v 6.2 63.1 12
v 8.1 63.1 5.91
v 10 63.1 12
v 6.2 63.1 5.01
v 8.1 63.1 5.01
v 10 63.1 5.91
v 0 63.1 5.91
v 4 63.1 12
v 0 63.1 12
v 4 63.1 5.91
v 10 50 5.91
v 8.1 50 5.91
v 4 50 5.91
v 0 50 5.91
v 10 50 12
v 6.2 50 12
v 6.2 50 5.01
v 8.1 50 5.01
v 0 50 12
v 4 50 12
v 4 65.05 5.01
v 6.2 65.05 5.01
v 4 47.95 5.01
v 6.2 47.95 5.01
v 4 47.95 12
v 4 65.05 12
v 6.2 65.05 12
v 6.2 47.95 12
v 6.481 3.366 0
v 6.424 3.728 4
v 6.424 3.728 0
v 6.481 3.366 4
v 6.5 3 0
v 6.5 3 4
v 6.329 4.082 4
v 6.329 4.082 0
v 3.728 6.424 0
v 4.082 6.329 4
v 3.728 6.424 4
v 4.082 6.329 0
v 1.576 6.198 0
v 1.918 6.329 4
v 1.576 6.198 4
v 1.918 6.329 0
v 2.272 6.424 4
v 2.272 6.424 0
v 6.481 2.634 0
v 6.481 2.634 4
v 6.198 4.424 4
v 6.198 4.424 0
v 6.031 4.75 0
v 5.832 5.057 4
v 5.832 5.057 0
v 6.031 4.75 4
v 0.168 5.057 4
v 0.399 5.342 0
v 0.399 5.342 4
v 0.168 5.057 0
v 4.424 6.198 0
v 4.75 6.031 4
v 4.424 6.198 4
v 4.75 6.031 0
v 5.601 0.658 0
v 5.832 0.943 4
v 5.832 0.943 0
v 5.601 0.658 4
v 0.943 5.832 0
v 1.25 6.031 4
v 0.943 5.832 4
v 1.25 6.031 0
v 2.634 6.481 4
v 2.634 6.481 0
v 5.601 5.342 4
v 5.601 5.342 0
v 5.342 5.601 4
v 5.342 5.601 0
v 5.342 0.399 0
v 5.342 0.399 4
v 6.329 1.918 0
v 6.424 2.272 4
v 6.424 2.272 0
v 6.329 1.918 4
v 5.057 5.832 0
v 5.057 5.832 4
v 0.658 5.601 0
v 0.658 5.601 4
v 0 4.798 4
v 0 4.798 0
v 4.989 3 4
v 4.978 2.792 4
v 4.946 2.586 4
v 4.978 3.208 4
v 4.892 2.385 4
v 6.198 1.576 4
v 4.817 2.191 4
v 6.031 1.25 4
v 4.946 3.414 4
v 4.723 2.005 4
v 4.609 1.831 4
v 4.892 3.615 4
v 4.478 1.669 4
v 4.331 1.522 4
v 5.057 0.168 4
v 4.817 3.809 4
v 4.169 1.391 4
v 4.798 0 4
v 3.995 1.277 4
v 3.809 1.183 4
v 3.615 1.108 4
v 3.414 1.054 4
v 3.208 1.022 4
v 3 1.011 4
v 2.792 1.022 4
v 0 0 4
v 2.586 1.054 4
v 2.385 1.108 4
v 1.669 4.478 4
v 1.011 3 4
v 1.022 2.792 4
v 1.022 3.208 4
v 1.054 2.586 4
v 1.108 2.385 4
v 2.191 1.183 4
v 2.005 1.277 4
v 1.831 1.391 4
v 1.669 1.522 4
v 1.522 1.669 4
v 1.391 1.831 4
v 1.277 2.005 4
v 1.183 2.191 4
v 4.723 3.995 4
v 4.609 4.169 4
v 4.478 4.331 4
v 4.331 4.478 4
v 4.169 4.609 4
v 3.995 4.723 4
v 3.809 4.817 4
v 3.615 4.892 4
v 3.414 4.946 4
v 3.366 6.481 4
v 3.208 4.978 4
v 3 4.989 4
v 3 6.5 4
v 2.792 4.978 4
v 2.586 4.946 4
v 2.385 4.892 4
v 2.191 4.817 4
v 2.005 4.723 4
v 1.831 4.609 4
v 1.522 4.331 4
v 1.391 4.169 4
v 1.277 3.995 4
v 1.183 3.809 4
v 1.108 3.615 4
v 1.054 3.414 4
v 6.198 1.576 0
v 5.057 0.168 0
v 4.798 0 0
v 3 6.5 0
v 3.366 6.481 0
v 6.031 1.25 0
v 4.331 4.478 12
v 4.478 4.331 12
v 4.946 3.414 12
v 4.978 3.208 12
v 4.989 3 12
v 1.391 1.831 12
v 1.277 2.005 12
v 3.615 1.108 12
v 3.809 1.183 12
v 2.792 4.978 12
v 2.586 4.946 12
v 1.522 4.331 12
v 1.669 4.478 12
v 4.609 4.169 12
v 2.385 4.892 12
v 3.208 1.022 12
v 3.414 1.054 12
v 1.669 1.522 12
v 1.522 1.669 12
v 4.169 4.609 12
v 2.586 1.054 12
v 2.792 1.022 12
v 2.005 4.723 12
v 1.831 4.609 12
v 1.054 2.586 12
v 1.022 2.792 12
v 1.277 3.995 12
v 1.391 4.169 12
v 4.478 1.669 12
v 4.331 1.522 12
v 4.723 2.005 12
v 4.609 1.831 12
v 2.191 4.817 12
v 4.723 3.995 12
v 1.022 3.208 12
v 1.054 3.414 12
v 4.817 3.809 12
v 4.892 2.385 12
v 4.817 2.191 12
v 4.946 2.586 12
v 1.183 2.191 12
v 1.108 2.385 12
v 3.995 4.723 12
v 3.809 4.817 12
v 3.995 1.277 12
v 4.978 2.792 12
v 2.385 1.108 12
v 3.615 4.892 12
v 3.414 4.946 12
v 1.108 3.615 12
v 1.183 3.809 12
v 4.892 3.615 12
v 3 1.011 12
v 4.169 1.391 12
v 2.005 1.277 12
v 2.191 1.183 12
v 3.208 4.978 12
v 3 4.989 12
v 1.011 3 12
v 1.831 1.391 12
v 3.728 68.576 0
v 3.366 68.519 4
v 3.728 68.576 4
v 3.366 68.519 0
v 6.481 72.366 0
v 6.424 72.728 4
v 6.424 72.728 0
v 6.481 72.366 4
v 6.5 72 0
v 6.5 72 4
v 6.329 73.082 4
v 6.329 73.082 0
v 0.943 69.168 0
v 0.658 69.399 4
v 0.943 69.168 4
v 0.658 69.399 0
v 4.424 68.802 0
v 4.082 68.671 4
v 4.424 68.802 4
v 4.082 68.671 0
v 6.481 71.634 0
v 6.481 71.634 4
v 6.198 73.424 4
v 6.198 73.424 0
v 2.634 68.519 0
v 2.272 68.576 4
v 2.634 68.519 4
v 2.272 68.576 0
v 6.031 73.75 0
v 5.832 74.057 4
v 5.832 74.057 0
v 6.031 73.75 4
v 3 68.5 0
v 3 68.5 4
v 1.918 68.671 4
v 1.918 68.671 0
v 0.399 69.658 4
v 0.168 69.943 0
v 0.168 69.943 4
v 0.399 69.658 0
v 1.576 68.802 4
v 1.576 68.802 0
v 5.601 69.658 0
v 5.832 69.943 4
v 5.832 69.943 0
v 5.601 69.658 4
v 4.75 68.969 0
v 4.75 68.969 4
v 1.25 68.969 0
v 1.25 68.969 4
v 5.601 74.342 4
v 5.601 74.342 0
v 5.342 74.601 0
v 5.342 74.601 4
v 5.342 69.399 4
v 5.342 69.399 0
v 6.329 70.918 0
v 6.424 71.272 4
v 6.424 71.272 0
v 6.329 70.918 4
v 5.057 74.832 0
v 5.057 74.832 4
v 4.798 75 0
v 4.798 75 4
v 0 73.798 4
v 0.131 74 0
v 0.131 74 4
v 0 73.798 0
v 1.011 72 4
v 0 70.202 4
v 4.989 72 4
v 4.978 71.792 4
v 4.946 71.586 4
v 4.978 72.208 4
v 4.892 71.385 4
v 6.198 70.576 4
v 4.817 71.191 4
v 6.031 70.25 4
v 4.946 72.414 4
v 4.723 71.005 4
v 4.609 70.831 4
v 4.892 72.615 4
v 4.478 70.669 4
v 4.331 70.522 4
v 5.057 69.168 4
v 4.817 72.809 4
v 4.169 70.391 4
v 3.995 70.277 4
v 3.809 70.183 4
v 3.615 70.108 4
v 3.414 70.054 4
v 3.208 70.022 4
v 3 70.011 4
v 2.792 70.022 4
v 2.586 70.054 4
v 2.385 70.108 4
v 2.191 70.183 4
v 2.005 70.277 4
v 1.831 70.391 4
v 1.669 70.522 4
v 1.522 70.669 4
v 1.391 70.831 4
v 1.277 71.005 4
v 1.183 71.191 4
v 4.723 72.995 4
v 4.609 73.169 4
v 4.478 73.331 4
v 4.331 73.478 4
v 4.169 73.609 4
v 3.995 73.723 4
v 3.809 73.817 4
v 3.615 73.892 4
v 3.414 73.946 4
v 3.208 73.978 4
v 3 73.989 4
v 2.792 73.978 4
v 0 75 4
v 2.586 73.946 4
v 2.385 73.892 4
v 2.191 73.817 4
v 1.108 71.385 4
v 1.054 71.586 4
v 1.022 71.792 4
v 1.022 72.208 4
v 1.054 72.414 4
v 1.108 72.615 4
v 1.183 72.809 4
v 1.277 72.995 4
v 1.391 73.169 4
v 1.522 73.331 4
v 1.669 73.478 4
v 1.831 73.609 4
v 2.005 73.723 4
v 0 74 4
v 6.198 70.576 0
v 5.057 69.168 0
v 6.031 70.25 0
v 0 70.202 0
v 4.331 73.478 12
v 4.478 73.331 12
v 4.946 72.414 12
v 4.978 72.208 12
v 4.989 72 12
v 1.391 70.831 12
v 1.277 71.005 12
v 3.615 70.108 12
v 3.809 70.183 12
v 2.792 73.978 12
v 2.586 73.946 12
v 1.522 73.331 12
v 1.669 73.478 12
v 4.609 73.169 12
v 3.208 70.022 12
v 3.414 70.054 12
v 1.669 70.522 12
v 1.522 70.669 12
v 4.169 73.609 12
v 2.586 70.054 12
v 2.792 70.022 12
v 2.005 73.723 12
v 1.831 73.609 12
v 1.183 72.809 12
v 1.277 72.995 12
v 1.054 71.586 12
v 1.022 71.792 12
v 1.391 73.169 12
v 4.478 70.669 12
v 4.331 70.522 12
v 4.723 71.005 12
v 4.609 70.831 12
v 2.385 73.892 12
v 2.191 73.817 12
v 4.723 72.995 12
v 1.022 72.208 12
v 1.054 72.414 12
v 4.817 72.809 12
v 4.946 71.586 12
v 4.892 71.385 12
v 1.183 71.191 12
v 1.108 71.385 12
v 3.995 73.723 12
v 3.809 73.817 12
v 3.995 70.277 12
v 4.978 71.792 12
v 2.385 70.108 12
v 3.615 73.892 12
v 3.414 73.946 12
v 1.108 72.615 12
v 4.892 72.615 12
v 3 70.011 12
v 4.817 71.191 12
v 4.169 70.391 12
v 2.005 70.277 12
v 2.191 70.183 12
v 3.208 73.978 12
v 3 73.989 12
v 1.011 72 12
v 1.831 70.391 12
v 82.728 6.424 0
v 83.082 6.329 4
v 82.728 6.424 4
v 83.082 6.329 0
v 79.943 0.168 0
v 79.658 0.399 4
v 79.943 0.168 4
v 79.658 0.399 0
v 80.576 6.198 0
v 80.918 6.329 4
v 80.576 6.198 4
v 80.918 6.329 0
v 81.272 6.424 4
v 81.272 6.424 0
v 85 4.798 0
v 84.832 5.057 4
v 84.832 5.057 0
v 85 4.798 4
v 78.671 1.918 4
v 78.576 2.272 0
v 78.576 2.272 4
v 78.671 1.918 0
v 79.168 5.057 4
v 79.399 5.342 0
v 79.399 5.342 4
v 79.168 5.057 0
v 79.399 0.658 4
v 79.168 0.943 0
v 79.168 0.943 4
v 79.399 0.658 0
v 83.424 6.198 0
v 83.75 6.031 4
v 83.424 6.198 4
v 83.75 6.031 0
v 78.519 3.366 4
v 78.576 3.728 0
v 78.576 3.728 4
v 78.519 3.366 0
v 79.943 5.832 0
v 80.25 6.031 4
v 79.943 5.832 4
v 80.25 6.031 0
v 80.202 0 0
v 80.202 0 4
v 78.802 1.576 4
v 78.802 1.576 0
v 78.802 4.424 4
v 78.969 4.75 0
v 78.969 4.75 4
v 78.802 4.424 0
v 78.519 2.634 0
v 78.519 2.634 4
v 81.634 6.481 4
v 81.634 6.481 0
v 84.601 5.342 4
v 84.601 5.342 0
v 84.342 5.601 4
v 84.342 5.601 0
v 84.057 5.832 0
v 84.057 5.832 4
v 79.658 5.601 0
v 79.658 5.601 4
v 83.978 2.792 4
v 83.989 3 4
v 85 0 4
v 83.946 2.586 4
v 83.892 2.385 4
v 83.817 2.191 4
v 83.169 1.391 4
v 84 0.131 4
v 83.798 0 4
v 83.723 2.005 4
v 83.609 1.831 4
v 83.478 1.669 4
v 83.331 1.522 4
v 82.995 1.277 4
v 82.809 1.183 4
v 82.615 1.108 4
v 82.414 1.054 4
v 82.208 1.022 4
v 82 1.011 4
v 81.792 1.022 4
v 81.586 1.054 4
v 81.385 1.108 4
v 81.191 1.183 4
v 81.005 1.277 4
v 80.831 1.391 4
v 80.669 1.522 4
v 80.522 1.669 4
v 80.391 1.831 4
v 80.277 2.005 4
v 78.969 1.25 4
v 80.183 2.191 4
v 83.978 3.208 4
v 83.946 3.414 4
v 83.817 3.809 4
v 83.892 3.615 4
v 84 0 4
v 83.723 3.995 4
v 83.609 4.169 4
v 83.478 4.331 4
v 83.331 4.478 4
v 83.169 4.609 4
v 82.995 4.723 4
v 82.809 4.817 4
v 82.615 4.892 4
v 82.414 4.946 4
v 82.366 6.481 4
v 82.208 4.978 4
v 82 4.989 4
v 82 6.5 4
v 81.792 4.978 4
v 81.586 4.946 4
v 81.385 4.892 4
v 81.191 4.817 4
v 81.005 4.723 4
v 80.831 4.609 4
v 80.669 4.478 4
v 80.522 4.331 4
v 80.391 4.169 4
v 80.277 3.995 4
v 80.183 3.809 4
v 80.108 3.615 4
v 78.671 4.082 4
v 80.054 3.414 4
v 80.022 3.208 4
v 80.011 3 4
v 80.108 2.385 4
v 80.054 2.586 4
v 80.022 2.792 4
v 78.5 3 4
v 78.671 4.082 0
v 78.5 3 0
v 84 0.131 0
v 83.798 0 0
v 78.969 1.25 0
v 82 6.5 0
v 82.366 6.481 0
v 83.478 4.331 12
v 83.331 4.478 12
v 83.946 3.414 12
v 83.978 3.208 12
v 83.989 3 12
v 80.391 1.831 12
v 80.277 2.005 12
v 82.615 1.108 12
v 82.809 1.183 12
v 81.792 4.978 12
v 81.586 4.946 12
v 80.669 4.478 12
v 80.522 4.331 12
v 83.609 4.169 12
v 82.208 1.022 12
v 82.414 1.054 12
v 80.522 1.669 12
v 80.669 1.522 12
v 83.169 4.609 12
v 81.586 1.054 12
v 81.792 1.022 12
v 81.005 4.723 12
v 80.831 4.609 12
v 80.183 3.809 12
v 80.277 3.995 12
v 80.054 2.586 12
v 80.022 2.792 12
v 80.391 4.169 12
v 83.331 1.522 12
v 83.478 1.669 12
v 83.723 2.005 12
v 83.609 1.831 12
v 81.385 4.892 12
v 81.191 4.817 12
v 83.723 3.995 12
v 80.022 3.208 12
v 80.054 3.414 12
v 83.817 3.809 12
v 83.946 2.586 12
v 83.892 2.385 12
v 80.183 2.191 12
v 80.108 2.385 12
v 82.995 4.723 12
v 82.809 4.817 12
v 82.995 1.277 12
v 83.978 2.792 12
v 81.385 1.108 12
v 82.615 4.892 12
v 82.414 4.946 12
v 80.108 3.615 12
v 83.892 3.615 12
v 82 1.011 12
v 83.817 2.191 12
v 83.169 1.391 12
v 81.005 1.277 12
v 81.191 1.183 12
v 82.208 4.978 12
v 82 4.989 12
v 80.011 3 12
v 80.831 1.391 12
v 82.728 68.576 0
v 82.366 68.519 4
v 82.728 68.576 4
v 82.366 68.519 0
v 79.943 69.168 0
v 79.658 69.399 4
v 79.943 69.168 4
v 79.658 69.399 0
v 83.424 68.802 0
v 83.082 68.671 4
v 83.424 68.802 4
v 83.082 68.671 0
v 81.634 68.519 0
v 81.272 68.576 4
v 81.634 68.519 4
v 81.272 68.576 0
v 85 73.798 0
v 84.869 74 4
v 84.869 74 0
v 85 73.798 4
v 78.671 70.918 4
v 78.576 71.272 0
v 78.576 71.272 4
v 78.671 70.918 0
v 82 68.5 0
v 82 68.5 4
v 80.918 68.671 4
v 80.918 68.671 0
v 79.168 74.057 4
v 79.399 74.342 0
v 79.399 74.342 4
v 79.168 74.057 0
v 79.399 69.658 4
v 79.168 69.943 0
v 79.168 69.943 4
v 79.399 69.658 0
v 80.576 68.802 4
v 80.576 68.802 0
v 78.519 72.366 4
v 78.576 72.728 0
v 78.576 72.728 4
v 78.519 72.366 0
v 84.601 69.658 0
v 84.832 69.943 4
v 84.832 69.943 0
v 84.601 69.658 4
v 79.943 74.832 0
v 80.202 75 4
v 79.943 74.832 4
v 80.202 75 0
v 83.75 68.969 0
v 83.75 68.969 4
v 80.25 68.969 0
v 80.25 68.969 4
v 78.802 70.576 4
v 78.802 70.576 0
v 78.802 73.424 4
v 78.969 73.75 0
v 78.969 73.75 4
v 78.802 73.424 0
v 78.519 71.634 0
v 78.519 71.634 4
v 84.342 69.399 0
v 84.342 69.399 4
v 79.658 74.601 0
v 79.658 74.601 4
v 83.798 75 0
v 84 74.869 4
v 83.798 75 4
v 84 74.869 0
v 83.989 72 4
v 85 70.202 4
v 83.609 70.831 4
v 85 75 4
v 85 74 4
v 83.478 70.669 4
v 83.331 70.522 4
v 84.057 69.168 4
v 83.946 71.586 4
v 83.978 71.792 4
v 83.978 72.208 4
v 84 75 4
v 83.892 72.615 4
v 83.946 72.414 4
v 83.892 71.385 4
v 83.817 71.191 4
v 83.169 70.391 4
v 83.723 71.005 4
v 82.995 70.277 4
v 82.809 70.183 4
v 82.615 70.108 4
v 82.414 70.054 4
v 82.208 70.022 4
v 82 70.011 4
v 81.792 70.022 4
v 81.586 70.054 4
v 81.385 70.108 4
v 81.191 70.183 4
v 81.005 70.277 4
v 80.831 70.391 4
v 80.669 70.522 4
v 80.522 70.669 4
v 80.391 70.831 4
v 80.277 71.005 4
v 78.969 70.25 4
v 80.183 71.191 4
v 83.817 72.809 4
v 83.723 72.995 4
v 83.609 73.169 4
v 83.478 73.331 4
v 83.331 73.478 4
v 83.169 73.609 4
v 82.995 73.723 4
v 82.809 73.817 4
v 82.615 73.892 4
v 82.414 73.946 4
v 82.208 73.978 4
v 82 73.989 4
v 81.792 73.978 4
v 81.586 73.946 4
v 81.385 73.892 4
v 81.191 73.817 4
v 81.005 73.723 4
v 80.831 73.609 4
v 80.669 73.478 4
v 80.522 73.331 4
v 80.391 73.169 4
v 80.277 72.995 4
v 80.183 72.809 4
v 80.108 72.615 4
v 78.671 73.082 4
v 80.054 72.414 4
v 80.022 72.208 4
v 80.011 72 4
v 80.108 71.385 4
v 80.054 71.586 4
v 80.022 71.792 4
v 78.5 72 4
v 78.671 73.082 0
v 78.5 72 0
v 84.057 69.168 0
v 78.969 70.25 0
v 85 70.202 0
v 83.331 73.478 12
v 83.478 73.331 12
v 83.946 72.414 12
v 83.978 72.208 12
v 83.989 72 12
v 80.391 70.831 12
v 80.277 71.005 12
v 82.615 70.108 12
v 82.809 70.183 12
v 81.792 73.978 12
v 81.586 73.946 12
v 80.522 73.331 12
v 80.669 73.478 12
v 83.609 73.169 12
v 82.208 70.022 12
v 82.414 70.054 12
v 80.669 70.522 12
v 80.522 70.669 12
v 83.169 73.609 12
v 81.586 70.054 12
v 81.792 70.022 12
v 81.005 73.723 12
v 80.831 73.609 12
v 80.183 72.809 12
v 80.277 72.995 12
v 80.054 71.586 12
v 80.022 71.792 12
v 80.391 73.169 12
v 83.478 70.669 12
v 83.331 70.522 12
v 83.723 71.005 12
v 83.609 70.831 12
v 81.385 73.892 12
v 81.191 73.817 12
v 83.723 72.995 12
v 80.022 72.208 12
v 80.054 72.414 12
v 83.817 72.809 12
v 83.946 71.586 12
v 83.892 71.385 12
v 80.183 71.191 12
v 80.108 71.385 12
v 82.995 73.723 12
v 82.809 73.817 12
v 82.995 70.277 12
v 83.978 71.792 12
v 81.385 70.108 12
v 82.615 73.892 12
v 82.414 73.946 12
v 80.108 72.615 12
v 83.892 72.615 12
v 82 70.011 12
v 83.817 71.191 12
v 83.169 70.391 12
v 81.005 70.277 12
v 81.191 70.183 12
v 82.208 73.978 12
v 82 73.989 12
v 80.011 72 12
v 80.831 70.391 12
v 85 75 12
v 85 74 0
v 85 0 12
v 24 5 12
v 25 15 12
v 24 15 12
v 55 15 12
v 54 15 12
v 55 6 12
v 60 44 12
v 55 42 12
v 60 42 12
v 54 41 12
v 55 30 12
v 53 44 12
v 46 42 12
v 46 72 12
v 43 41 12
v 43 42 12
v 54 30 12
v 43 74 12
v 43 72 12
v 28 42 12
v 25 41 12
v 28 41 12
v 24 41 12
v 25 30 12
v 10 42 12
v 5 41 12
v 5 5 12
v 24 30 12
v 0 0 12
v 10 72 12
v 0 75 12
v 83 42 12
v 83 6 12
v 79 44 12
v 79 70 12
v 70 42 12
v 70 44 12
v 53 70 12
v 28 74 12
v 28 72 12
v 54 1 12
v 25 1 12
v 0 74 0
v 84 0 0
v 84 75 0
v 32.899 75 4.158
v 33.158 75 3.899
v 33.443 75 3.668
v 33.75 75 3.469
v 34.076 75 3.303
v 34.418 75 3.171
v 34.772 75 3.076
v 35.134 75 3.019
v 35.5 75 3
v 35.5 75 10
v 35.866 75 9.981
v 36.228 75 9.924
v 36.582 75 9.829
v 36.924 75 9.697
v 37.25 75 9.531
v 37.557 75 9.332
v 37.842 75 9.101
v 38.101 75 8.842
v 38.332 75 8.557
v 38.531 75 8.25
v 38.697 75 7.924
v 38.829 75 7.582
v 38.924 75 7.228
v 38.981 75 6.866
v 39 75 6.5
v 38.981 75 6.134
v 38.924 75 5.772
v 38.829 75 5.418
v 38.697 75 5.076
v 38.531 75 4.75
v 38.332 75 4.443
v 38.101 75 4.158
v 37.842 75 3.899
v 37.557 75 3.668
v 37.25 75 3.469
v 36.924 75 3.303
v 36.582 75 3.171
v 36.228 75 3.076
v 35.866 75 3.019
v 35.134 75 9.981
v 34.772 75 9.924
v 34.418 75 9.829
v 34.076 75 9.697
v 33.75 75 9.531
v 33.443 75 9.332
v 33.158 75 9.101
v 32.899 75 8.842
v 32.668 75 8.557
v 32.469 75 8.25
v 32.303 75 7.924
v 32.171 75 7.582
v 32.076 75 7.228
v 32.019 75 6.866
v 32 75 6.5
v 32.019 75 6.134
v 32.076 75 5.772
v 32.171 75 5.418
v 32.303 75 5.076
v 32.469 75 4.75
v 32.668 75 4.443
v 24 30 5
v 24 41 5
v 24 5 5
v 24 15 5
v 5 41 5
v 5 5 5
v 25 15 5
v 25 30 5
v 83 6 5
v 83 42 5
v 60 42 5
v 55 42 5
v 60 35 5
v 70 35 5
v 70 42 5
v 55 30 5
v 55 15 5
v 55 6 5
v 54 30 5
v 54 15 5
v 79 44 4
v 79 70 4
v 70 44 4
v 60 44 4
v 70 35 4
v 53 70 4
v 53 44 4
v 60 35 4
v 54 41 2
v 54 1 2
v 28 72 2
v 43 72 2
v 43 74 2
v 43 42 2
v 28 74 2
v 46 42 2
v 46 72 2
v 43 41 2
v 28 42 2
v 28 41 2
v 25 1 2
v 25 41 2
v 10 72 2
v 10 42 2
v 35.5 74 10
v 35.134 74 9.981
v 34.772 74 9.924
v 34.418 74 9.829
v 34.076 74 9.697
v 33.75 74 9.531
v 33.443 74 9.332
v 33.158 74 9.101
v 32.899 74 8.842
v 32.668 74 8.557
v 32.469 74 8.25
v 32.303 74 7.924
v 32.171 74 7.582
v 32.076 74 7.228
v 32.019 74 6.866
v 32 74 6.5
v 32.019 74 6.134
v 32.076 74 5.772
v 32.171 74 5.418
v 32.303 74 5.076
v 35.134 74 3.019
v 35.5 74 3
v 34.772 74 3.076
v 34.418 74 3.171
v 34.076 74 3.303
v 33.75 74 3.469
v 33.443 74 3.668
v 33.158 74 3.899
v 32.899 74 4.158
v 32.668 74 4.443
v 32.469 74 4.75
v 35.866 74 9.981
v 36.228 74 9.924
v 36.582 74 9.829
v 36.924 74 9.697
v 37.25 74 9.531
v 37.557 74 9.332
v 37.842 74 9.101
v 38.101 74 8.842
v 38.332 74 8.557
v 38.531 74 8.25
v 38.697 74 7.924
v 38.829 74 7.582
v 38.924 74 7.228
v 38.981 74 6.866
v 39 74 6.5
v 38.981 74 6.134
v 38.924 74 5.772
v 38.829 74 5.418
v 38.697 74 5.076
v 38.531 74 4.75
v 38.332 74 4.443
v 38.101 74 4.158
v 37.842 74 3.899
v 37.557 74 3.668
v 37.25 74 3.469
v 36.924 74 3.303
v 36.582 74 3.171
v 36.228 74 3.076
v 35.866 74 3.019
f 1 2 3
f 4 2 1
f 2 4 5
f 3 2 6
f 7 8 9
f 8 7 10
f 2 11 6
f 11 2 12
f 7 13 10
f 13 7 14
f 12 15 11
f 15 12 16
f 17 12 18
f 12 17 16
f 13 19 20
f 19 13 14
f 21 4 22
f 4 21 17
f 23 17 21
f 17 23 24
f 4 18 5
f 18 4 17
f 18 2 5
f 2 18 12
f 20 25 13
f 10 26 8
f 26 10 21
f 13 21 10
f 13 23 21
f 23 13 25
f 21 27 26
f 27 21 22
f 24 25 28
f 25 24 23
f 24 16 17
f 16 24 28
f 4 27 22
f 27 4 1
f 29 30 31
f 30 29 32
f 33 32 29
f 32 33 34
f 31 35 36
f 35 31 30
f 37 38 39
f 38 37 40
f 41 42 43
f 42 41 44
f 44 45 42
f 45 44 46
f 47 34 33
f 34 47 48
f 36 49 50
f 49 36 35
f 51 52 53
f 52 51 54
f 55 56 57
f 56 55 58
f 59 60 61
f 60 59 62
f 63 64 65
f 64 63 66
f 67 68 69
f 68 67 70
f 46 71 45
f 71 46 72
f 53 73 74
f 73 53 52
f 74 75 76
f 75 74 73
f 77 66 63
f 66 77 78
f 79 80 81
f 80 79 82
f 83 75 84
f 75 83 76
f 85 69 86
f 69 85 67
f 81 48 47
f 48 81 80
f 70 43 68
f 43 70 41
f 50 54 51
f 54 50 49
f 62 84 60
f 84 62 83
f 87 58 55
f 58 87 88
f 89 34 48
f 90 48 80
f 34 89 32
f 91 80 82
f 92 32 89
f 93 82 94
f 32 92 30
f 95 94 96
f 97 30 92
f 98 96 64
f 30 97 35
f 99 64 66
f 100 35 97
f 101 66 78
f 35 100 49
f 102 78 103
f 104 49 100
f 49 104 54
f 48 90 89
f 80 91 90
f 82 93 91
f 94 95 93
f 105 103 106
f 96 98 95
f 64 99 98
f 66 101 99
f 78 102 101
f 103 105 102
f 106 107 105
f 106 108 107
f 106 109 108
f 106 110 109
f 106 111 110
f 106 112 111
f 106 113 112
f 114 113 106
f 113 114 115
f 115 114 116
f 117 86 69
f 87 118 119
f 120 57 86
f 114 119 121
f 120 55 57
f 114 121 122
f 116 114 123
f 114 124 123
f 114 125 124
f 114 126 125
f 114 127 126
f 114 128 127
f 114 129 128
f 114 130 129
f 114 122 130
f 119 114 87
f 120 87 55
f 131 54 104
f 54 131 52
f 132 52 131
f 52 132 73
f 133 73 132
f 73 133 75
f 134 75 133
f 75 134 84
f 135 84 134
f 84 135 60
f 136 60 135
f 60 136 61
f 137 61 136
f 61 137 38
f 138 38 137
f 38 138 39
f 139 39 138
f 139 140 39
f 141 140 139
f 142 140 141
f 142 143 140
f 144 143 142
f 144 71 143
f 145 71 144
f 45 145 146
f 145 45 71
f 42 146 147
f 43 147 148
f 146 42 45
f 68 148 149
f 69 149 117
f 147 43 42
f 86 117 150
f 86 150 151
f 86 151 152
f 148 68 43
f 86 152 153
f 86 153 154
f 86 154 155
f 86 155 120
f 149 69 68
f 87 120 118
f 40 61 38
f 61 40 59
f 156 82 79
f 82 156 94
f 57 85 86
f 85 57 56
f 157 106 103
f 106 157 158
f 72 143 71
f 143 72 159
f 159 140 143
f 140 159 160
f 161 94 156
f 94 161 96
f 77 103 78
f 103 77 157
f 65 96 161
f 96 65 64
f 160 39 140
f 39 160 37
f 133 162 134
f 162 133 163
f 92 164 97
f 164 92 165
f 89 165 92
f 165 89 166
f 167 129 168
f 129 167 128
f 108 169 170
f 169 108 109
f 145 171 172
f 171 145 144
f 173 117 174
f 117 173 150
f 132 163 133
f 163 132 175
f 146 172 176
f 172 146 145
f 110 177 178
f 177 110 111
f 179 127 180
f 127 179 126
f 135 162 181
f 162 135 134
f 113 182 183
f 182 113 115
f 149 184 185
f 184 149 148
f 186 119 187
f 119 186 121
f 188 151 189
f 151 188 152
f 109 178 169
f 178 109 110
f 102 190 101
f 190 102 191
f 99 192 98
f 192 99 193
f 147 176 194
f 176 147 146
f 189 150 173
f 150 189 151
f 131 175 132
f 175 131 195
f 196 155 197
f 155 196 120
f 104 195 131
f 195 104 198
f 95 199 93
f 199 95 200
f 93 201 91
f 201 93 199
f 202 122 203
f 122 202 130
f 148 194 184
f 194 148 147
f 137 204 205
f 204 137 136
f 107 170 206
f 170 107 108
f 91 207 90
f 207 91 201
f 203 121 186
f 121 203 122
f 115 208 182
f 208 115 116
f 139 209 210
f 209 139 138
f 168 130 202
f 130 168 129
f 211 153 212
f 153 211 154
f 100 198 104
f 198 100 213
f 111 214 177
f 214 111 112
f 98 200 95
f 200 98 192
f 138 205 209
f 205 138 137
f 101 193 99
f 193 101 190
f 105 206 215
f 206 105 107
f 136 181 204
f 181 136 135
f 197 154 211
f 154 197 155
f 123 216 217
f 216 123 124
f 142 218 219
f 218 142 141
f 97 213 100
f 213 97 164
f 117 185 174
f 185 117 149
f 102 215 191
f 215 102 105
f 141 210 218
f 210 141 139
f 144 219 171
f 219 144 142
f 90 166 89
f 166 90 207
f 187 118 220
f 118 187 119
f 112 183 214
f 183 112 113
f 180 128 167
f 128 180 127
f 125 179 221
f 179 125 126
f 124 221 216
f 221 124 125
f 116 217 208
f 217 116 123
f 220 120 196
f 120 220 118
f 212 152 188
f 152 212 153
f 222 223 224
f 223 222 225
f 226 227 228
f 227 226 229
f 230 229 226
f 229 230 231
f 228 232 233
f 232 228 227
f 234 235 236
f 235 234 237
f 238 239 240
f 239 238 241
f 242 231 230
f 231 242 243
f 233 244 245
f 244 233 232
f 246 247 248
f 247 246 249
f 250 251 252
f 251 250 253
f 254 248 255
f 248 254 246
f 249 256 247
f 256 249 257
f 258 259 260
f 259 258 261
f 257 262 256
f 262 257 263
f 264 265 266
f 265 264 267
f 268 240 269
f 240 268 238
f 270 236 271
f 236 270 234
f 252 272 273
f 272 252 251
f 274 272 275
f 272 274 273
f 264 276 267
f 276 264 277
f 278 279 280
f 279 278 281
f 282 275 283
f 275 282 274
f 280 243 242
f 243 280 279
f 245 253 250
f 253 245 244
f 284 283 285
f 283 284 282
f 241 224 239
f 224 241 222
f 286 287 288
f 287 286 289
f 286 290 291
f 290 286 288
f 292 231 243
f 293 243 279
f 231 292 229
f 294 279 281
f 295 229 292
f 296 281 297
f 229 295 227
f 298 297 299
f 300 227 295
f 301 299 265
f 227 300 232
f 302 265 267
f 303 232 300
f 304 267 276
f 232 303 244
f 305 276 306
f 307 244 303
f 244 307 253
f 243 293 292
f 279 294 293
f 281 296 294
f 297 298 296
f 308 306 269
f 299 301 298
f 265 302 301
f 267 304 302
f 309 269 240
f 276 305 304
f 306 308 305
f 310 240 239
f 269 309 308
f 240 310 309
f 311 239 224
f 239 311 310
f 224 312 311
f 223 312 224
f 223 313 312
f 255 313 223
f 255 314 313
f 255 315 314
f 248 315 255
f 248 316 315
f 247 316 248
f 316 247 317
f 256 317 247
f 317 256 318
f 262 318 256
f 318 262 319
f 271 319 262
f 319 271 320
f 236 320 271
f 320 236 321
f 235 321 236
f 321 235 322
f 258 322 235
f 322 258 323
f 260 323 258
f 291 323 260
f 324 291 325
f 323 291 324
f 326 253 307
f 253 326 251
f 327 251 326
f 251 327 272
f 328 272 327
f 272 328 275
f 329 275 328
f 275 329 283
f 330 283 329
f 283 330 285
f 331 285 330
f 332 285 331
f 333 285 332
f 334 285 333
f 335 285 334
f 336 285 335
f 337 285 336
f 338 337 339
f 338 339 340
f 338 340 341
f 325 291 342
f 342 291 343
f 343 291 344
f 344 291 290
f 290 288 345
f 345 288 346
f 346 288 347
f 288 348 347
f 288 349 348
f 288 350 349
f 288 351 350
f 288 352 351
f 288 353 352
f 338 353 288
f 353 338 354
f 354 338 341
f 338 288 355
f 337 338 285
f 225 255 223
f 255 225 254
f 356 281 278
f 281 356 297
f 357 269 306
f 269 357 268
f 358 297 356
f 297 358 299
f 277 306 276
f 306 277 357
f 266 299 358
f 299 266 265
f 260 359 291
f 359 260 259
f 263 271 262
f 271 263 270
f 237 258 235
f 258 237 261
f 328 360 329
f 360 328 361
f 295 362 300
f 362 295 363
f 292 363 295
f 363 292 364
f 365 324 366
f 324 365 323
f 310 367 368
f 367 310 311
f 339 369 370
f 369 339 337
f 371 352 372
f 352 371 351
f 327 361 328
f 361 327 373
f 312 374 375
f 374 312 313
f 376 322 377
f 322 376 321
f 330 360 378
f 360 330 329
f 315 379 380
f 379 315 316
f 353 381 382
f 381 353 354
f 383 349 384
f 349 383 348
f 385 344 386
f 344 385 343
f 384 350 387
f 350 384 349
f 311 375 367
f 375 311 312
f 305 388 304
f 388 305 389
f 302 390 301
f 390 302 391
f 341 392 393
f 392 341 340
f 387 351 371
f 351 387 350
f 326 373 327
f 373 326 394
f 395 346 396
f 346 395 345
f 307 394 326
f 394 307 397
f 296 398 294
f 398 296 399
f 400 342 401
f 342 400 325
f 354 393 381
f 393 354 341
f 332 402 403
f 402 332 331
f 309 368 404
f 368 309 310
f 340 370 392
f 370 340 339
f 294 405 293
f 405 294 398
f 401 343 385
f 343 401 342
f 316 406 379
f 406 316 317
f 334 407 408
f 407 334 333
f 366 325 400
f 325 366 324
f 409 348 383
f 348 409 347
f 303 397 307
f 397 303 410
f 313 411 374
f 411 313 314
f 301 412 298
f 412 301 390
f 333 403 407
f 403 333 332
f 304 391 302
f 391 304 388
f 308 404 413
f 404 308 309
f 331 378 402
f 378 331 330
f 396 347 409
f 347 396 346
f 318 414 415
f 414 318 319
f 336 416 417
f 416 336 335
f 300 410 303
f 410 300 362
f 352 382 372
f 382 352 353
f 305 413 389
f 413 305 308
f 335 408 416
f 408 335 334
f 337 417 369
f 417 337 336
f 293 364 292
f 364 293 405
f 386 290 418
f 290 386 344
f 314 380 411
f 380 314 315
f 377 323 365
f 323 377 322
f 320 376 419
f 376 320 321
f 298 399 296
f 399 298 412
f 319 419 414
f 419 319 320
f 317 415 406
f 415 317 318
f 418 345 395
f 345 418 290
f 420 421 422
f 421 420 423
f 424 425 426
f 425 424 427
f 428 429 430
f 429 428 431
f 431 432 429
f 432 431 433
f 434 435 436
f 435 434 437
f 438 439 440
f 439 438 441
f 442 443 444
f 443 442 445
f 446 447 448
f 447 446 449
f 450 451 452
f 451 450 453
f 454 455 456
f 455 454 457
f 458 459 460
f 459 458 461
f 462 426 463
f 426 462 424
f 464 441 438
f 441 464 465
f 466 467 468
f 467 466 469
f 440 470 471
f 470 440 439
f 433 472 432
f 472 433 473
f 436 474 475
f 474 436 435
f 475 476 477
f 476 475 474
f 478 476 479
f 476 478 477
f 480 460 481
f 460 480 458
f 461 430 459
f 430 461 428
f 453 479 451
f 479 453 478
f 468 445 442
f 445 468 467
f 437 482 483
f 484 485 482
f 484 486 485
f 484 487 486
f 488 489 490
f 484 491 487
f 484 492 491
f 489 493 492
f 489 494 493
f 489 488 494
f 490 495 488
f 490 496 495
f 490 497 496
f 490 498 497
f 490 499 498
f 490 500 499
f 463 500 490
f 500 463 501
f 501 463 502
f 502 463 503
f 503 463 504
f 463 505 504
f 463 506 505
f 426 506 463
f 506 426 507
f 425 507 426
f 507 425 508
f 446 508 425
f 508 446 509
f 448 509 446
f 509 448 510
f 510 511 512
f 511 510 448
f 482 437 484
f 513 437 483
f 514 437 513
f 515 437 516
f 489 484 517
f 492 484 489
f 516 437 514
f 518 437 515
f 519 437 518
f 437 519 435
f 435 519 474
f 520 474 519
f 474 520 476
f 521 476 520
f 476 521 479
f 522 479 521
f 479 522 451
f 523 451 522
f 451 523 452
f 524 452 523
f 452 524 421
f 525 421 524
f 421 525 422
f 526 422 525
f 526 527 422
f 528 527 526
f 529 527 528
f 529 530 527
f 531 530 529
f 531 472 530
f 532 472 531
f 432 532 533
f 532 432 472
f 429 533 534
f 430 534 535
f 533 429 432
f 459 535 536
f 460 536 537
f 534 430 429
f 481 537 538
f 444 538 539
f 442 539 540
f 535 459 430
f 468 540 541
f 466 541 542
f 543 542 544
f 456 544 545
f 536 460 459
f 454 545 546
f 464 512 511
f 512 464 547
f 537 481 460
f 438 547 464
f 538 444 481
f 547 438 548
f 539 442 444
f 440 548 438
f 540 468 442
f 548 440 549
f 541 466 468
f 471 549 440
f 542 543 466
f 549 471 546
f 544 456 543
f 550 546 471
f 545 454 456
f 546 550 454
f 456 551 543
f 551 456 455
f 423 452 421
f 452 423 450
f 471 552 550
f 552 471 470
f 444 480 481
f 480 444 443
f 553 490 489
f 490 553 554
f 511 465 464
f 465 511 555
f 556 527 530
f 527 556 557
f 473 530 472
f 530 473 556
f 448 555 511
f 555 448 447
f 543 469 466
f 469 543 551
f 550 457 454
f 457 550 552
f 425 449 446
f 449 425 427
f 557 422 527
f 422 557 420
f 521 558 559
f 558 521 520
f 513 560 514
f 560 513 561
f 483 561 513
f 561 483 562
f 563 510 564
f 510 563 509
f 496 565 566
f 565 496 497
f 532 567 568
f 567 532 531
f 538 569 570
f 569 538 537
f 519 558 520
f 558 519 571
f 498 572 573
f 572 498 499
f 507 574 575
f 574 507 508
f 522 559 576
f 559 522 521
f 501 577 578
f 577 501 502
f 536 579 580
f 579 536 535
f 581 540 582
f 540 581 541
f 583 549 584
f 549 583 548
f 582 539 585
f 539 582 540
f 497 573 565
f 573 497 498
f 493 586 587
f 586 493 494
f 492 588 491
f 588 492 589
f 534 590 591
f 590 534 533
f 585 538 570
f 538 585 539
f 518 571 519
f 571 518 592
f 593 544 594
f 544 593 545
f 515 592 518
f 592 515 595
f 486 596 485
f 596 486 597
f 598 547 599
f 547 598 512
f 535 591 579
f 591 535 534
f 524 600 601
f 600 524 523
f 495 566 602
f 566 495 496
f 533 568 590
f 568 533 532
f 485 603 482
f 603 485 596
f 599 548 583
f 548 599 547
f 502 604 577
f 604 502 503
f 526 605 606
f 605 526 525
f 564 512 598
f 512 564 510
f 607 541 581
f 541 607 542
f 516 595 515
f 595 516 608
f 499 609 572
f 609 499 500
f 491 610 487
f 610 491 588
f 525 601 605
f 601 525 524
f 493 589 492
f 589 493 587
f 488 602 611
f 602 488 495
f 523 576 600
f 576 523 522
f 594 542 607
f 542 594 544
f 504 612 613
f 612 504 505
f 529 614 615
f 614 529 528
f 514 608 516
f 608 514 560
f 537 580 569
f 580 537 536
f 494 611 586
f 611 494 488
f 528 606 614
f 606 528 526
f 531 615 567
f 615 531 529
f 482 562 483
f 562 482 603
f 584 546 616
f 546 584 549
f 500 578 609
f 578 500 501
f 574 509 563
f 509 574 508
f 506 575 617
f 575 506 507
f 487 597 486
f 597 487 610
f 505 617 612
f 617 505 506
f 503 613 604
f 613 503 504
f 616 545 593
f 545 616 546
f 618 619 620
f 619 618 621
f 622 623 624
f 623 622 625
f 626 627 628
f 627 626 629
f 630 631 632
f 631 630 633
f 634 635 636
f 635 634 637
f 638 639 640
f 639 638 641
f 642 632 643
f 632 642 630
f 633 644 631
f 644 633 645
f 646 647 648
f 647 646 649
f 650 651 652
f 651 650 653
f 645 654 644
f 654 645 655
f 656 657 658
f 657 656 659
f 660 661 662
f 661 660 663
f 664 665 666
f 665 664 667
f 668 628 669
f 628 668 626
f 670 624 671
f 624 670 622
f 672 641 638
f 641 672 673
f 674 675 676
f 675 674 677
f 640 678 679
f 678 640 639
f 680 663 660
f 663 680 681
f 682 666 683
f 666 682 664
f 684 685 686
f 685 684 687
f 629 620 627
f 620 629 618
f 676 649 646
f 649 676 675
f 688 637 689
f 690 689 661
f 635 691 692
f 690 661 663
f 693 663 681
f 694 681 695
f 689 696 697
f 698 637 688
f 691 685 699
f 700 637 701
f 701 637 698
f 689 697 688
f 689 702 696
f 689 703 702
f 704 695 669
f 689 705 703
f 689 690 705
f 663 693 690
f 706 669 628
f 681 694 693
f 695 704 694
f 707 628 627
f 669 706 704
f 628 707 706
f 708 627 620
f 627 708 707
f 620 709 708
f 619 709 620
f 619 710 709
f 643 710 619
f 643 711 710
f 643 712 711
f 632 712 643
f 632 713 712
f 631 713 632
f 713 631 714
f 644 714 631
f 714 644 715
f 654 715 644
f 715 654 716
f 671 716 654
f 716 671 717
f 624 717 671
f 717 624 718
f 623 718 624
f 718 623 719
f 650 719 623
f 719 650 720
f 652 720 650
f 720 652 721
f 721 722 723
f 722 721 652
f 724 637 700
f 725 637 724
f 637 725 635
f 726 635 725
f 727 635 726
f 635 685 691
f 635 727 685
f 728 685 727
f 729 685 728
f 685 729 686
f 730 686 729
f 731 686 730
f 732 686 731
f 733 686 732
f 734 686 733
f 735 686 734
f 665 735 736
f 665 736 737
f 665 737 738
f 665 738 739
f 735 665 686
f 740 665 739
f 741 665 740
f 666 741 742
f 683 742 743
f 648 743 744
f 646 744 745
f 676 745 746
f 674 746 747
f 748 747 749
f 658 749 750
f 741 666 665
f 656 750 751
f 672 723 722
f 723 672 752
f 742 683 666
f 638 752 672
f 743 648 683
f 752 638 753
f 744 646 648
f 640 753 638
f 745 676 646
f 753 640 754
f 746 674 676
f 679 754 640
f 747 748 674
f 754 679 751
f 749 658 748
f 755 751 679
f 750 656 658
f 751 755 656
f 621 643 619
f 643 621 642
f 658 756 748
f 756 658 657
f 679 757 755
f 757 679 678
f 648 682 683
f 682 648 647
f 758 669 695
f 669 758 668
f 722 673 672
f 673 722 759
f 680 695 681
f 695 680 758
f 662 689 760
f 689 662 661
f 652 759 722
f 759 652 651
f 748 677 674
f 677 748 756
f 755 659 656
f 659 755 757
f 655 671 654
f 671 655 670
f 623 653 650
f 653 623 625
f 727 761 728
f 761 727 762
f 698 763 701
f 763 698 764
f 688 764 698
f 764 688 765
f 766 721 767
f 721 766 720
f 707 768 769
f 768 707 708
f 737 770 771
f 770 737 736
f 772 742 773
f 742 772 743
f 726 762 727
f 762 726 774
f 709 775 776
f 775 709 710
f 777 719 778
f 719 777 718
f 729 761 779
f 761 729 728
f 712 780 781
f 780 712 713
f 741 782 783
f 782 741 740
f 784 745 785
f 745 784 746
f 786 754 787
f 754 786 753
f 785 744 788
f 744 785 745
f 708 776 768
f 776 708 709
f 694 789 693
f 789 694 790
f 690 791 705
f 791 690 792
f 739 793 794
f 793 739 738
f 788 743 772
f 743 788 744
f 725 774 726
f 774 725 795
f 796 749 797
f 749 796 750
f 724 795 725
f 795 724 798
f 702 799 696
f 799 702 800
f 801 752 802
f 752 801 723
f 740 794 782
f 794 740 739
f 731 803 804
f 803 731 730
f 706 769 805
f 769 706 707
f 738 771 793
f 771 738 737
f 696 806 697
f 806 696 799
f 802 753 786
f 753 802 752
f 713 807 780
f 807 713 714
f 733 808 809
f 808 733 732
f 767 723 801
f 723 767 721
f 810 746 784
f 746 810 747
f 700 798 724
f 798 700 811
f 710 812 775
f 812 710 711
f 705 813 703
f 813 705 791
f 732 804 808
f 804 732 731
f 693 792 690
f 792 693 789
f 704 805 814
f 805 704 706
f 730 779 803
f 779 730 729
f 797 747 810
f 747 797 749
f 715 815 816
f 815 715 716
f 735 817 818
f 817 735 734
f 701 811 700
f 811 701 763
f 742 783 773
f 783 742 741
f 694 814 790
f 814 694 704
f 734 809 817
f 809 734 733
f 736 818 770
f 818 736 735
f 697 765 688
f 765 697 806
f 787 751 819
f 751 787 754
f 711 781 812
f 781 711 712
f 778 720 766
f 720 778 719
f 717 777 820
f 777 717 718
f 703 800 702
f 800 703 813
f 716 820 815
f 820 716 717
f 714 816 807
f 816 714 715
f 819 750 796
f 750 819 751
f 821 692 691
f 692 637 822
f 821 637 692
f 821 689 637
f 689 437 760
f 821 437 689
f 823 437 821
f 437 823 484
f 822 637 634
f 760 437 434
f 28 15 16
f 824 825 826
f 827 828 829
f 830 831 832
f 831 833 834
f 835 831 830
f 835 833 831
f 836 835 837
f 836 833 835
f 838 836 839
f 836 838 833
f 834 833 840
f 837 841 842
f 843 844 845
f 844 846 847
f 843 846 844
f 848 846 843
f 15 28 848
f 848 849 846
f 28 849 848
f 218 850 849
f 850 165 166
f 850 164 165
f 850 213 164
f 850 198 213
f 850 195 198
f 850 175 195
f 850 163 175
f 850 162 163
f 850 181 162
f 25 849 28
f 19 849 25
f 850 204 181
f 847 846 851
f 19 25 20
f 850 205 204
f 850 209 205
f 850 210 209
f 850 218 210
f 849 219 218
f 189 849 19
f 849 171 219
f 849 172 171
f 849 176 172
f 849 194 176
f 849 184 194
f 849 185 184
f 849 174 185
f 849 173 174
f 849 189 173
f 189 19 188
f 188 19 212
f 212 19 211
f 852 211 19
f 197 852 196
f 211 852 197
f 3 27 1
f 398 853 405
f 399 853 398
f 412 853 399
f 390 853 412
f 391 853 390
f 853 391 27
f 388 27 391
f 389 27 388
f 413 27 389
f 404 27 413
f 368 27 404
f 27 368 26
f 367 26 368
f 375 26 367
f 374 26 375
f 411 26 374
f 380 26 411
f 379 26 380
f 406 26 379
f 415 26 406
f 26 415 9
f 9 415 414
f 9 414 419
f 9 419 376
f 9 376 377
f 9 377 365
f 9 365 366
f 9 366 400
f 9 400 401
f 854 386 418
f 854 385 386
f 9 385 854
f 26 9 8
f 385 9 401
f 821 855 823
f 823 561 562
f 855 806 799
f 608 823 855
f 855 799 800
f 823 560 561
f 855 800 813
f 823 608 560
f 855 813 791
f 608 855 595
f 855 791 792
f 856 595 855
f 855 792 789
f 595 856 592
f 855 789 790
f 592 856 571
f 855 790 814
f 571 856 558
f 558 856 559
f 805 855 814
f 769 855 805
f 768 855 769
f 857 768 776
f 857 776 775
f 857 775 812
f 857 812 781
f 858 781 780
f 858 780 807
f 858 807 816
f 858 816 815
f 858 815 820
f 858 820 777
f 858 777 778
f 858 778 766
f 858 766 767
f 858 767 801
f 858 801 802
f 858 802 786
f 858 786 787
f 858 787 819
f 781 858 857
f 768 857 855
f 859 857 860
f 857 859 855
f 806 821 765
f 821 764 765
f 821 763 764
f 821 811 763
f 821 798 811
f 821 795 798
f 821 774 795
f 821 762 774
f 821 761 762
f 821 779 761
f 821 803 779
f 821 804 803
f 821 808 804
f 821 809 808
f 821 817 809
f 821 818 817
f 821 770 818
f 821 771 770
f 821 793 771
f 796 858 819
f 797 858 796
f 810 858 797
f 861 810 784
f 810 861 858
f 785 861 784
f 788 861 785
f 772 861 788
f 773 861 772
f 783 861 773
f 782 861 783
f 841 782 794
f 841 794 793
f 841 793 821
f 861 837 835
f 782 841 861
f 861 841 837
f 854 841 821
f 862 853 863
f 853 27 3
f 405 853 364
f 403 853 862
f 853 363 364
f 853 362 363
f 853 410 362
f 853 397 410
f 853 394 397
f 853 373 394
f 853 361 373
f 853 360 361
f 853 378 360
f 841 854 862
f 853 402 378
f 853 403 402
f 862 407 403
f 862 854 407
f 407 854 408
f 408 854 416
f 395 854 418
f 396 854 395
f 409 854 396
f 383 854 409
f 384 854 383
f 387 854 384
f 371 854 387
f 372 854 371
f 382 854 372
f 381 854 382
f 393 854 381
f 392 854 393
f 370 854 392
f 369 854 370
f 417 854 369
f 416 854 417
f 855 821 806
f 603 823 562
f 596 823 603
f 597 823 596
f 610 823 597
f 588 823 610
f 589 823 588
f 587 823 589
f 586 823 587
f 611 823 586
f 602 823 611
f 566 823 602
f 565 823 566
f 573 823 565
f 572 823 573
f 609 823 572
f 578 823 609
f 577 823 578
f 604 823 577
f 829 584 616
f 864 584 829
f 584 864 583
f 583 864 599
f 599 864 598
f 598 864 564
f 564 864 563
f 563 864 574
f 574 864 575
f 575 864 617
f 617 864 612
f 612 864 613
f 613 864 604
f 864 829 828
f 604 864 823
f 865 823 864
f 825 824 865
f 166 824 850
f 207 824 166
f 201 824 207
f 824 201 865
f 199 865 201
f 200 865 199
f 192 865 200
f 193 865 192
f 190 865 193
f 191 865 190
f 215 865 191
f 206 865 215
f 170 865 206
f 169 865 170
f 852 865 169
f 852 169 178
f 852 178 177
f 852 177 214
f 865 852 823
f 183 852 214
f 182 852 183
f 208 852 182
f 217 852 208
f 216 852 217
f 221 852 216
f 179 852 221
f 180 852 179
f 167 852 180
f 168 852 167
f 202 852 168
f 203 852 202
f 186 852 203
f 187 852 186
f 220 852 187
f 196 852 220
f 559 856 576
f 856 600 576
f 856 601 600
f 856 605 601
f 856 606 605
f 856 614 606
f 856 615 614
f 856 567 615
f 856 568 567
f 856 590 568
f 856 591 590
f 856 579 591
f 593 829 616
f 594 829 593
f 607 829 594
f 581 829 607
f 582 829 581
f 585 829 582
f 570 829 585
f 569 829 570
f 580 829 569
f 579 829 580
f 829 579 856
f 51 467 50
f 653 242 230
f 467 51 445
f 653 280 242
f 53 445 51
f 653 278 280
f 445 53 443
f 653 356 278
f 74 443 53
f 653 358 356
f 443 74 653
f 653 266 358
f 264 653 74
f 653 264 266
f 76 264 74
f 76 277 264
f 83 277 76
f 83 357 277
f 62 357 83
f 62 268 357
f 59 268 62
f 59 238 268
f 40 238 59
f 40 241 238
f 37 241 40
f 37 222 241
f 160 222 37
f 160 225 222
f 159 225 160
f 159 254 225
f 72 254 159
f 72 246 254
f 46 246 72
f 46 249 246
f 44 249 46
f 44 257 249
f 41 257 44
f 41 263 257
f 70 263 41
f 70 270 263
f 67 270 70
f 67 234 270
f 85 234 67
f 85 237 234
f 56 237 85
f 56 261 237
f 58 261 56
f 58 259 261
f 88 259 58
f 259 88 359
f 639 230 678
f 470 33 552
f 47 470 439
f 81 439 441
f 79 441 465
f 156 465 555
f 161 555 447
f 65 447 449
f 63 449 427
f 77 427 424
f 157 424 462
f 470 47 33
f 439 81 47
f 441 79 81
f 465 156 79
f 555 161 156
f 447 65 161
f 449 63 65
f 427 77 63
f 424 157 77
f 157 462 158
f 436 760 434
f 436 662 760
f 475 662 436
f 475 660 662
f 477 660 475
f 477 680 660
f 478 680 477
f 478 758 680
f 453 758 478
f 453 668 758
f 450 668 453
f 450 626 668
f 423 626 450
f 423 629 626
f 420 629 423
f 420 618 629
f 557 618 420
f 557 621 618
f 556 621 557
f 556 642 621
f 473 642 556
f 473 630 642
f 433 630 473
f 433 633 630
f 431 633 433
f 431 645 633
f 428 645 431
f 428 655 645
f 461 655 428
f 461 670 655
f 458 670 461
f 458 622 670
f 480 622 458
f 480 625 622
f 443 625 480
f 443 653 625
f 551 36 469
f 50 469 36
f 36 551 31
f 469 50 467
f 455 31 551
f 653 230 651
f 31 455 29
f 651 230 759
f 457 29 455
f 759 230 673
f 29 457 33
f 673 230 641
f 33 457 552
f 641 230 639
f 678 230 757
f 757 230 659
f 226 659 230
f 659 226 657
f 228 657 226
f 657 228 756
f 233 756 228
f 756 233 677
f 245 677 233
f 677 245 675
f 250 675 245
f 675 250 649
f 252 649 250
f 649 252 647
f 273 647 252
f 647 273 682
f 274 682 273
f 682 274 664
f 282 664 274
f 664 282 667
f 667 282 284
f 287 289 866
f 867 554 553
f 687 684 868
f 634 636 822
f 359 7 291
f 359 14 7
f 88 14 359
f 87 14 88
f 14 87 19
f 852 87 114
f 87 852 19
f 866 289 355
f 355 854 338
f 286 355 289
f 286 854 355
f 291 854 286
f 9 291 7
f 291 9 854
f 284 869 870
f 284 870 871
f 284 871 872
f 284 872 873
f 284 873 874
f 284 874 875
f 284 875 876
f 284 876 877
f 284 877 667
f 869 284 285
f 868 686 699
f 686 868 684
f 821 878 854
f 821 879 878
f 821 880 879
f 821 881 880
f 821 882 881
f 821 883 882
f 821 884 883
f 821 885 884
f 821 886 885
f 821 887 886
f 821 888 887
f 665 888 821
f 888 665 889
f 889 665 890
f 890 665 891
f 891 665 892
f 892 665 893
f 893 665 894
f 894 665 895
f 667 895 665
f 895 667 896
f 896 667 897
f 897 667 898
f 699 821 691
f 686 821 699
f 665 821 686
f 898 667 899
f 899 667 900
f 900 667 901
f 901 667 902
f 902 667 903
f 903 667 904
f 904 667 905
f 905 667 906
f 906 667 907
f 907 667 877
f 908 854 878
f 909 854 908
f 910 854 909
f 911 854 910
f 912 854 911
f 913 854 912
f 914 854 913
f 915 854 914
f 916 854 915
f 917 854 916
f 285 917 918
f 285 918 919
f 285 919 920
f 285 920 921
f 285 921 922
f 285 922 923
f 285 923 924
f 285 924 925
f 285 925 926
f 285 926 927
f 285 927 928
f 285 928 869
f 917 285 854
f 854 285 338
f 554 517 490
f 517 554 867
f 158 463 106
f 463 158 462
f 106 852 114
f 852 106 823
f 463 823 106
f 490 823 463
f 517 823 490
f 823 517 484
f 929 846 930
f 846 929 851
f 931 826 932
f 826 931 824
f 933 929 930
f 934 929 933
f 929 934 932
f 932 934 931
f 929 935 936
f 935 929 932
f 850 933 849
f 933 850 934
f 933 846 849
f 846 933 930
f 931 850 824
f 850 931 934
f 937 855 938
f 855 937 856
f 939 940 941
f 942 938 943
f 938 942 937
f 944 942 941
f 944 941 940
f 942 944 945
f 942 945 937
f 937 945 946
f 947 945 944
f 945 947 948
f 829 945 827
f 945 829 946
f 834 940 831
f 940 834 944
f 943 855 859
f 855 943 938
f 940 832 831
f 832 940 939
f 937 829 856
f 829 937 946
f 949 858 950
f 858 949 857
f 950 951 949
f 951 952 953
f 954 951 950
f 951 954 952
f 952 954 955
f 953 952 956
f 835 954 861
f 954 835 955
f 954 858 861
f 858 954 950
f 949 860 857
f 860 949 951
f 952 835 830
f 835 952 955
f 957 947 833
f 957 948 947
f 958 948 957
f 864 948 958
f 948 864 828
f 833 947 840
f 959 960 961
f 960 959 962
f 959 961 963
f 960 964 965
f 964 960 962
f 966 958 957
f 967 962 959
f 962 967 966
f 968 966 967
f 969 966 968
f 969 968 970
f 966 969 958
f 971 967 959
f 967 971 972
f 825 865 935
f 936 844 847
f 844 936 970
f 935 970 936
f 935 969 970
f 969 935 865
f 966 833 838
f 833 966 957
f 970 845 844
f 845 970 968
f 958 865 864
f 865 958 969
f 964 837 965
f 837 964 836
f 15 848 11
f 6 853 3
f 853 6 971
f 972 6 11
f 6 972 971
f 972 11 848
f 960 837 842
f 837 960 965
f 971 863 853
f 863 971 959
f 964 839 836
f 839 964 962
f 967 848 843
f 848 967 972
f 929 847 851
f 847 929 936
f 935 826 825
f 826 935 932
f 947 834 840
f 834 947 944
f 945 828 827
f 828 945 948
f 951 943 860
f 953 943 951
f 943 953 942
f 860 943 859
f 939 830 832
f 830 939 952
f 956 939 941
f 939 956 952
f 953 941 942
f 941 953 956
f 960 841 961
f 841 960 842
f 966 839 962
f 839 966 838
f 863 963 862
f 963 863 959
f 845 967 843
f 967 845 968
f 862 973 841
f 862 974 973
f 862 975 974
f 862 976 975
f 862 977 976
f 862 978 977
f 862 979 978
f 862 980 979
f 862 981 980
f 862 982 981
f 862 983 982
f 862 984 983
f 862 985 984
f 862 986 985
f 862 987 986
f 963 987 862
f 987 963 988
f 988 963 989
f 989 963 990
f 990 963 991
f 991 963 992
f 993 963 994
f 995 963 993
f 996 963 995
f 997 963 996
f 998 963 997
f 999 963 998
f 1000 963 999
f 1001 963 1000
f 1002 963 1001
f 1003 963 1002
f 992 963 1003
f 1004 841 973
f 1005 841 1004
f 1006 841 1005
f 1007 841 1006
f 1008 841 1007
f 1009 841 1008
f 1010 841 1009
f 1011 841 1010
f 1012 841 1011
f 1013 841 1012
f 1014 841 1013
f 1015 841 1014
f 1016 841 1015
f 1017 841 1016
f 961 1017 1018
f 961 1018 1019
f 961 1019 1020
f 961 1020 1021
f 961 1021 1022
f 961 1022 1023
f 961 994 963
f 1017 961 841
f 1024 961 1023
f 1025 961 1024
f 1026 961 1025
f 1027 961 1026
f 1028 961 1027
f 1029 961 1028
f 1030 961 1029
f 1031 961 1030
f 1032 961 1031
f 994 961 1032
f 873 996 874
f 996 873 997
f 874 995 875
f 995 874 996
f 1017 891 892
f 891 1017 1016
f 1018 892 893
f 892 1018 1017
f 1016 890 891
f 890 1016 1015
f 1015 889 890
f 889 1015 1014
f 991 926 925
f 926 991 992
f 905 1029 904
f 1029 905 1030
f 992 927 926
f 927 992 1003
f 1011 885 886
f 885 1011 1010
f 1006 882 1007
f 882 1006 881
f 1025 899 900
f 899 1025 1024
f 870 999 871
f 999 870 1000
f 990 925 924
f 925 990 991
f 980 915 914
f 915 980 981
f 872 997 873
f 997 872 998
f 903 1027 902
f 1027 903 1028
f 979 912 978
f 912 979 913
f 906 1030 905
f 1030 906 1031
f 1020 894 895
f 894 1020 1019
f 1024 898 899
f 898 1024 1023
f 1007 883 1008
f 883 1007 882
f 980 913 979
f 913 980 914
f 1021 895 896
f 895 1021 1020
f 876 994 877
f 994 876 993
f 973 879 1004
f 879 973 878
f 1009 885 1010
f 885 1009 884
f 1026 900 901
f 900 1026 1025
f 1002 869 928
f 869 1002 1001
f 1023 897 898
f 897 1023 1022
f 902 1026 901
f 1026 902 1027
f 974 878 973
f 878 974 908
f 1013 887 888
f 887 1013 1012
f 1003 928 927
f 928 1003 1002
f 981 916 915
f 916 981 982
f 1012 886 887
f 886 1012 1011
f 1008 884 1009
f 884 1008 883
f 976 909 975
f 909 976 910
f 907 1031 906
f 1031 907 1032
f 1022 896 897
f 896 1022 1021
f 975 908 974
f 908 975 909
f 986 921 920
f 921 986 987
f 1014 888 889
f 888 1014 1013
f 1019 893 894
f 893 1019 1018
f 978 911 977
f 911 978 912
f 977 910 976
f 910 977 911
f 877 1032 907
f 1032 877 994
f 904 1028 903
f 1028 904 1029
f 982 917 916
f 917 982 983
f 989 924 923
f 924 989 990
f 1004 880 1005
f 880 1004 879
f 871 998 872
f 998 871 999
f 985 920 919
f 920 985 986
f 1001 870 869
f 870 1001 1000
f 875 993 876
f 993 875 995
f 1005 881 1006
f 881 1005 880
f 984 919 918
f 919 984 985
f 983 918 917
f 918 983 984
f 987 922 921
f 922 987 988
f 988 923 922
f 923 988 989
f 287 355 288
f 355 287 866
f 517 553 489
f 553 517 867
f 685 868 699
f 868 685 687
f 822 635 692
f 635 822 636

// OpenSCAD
include <MCAD/nuts_and_bolts.scad>
$fn = 60;
module main()
{
//	translate([0,0,0])cube([10,10,5]);
//	translate([3,3,0])nutHole(4);
	difference()
	{
		//translate([0,0,16])cube([85,75,2]);
		cube([85,75,12]);
		translate([5,5,5])arduino();
		translate([55,6,5])GPS();
		translate([53,44,4])GPSat();
		translate([25,1,2])GSM();	translate([-2,50,12.01])rotate([0,180,-90])USB();
		translate([10,42,2])USBCUT();
		translate([22,15,5])wire();
		translate([53,15,5])wire();
		translate([60,35,4])wire2();
		translate([28,35,2])wire22();
		translate([35.5,70,6.5])rotate([90,0,0])CAT();
	translate([-2,-2,0])cube([5,5,4]);
	scale([1,1,2])translate([3,3,2])boltHole(4,length=20);
	translate([-2,74,0])cube([5,5,4]);
	scale([1,1,2])translate([3,72,2])boltHole(4,length=30);
	translate([84,-2,0])cube([5,5,4]);		
	scale([1,1,2])translate([82,3,2])boltHole(4,length=30);
	translate([84,74,0])cube([5,5,4]);		
	scale([1,1,2])translate([82,72,2])boltHole(4,length=30);		
	}
}
module CAT()
{
	cylinder(h=20, d=7, center=true);
}
module wire2()
{
	cube([10,15,10.01]);
}
module wire22()
{
	cube([15,39,10.01]);
}
module wire()
{
	cube([5,15,10.01]);
}
module arduino()
{
	cube([19,36,10.01]);
}
module GPS()
{
	cube([28,36,10.01]);
}
module GPSat()
{
	cube([26,26,8.01]);
}
module GSM()
{
	cube([29,40,10.01]);
}
module USBCUT()
{
	cube([36,30,10.01]);
}
main();

module USB()
{
	#cube([13.1,14.1,6.1]);
	translate([0,6,0])cube([13.1,4.1,7]);
	translate([-2.05,6,0])cube([17.1,2.2,7]);
}
